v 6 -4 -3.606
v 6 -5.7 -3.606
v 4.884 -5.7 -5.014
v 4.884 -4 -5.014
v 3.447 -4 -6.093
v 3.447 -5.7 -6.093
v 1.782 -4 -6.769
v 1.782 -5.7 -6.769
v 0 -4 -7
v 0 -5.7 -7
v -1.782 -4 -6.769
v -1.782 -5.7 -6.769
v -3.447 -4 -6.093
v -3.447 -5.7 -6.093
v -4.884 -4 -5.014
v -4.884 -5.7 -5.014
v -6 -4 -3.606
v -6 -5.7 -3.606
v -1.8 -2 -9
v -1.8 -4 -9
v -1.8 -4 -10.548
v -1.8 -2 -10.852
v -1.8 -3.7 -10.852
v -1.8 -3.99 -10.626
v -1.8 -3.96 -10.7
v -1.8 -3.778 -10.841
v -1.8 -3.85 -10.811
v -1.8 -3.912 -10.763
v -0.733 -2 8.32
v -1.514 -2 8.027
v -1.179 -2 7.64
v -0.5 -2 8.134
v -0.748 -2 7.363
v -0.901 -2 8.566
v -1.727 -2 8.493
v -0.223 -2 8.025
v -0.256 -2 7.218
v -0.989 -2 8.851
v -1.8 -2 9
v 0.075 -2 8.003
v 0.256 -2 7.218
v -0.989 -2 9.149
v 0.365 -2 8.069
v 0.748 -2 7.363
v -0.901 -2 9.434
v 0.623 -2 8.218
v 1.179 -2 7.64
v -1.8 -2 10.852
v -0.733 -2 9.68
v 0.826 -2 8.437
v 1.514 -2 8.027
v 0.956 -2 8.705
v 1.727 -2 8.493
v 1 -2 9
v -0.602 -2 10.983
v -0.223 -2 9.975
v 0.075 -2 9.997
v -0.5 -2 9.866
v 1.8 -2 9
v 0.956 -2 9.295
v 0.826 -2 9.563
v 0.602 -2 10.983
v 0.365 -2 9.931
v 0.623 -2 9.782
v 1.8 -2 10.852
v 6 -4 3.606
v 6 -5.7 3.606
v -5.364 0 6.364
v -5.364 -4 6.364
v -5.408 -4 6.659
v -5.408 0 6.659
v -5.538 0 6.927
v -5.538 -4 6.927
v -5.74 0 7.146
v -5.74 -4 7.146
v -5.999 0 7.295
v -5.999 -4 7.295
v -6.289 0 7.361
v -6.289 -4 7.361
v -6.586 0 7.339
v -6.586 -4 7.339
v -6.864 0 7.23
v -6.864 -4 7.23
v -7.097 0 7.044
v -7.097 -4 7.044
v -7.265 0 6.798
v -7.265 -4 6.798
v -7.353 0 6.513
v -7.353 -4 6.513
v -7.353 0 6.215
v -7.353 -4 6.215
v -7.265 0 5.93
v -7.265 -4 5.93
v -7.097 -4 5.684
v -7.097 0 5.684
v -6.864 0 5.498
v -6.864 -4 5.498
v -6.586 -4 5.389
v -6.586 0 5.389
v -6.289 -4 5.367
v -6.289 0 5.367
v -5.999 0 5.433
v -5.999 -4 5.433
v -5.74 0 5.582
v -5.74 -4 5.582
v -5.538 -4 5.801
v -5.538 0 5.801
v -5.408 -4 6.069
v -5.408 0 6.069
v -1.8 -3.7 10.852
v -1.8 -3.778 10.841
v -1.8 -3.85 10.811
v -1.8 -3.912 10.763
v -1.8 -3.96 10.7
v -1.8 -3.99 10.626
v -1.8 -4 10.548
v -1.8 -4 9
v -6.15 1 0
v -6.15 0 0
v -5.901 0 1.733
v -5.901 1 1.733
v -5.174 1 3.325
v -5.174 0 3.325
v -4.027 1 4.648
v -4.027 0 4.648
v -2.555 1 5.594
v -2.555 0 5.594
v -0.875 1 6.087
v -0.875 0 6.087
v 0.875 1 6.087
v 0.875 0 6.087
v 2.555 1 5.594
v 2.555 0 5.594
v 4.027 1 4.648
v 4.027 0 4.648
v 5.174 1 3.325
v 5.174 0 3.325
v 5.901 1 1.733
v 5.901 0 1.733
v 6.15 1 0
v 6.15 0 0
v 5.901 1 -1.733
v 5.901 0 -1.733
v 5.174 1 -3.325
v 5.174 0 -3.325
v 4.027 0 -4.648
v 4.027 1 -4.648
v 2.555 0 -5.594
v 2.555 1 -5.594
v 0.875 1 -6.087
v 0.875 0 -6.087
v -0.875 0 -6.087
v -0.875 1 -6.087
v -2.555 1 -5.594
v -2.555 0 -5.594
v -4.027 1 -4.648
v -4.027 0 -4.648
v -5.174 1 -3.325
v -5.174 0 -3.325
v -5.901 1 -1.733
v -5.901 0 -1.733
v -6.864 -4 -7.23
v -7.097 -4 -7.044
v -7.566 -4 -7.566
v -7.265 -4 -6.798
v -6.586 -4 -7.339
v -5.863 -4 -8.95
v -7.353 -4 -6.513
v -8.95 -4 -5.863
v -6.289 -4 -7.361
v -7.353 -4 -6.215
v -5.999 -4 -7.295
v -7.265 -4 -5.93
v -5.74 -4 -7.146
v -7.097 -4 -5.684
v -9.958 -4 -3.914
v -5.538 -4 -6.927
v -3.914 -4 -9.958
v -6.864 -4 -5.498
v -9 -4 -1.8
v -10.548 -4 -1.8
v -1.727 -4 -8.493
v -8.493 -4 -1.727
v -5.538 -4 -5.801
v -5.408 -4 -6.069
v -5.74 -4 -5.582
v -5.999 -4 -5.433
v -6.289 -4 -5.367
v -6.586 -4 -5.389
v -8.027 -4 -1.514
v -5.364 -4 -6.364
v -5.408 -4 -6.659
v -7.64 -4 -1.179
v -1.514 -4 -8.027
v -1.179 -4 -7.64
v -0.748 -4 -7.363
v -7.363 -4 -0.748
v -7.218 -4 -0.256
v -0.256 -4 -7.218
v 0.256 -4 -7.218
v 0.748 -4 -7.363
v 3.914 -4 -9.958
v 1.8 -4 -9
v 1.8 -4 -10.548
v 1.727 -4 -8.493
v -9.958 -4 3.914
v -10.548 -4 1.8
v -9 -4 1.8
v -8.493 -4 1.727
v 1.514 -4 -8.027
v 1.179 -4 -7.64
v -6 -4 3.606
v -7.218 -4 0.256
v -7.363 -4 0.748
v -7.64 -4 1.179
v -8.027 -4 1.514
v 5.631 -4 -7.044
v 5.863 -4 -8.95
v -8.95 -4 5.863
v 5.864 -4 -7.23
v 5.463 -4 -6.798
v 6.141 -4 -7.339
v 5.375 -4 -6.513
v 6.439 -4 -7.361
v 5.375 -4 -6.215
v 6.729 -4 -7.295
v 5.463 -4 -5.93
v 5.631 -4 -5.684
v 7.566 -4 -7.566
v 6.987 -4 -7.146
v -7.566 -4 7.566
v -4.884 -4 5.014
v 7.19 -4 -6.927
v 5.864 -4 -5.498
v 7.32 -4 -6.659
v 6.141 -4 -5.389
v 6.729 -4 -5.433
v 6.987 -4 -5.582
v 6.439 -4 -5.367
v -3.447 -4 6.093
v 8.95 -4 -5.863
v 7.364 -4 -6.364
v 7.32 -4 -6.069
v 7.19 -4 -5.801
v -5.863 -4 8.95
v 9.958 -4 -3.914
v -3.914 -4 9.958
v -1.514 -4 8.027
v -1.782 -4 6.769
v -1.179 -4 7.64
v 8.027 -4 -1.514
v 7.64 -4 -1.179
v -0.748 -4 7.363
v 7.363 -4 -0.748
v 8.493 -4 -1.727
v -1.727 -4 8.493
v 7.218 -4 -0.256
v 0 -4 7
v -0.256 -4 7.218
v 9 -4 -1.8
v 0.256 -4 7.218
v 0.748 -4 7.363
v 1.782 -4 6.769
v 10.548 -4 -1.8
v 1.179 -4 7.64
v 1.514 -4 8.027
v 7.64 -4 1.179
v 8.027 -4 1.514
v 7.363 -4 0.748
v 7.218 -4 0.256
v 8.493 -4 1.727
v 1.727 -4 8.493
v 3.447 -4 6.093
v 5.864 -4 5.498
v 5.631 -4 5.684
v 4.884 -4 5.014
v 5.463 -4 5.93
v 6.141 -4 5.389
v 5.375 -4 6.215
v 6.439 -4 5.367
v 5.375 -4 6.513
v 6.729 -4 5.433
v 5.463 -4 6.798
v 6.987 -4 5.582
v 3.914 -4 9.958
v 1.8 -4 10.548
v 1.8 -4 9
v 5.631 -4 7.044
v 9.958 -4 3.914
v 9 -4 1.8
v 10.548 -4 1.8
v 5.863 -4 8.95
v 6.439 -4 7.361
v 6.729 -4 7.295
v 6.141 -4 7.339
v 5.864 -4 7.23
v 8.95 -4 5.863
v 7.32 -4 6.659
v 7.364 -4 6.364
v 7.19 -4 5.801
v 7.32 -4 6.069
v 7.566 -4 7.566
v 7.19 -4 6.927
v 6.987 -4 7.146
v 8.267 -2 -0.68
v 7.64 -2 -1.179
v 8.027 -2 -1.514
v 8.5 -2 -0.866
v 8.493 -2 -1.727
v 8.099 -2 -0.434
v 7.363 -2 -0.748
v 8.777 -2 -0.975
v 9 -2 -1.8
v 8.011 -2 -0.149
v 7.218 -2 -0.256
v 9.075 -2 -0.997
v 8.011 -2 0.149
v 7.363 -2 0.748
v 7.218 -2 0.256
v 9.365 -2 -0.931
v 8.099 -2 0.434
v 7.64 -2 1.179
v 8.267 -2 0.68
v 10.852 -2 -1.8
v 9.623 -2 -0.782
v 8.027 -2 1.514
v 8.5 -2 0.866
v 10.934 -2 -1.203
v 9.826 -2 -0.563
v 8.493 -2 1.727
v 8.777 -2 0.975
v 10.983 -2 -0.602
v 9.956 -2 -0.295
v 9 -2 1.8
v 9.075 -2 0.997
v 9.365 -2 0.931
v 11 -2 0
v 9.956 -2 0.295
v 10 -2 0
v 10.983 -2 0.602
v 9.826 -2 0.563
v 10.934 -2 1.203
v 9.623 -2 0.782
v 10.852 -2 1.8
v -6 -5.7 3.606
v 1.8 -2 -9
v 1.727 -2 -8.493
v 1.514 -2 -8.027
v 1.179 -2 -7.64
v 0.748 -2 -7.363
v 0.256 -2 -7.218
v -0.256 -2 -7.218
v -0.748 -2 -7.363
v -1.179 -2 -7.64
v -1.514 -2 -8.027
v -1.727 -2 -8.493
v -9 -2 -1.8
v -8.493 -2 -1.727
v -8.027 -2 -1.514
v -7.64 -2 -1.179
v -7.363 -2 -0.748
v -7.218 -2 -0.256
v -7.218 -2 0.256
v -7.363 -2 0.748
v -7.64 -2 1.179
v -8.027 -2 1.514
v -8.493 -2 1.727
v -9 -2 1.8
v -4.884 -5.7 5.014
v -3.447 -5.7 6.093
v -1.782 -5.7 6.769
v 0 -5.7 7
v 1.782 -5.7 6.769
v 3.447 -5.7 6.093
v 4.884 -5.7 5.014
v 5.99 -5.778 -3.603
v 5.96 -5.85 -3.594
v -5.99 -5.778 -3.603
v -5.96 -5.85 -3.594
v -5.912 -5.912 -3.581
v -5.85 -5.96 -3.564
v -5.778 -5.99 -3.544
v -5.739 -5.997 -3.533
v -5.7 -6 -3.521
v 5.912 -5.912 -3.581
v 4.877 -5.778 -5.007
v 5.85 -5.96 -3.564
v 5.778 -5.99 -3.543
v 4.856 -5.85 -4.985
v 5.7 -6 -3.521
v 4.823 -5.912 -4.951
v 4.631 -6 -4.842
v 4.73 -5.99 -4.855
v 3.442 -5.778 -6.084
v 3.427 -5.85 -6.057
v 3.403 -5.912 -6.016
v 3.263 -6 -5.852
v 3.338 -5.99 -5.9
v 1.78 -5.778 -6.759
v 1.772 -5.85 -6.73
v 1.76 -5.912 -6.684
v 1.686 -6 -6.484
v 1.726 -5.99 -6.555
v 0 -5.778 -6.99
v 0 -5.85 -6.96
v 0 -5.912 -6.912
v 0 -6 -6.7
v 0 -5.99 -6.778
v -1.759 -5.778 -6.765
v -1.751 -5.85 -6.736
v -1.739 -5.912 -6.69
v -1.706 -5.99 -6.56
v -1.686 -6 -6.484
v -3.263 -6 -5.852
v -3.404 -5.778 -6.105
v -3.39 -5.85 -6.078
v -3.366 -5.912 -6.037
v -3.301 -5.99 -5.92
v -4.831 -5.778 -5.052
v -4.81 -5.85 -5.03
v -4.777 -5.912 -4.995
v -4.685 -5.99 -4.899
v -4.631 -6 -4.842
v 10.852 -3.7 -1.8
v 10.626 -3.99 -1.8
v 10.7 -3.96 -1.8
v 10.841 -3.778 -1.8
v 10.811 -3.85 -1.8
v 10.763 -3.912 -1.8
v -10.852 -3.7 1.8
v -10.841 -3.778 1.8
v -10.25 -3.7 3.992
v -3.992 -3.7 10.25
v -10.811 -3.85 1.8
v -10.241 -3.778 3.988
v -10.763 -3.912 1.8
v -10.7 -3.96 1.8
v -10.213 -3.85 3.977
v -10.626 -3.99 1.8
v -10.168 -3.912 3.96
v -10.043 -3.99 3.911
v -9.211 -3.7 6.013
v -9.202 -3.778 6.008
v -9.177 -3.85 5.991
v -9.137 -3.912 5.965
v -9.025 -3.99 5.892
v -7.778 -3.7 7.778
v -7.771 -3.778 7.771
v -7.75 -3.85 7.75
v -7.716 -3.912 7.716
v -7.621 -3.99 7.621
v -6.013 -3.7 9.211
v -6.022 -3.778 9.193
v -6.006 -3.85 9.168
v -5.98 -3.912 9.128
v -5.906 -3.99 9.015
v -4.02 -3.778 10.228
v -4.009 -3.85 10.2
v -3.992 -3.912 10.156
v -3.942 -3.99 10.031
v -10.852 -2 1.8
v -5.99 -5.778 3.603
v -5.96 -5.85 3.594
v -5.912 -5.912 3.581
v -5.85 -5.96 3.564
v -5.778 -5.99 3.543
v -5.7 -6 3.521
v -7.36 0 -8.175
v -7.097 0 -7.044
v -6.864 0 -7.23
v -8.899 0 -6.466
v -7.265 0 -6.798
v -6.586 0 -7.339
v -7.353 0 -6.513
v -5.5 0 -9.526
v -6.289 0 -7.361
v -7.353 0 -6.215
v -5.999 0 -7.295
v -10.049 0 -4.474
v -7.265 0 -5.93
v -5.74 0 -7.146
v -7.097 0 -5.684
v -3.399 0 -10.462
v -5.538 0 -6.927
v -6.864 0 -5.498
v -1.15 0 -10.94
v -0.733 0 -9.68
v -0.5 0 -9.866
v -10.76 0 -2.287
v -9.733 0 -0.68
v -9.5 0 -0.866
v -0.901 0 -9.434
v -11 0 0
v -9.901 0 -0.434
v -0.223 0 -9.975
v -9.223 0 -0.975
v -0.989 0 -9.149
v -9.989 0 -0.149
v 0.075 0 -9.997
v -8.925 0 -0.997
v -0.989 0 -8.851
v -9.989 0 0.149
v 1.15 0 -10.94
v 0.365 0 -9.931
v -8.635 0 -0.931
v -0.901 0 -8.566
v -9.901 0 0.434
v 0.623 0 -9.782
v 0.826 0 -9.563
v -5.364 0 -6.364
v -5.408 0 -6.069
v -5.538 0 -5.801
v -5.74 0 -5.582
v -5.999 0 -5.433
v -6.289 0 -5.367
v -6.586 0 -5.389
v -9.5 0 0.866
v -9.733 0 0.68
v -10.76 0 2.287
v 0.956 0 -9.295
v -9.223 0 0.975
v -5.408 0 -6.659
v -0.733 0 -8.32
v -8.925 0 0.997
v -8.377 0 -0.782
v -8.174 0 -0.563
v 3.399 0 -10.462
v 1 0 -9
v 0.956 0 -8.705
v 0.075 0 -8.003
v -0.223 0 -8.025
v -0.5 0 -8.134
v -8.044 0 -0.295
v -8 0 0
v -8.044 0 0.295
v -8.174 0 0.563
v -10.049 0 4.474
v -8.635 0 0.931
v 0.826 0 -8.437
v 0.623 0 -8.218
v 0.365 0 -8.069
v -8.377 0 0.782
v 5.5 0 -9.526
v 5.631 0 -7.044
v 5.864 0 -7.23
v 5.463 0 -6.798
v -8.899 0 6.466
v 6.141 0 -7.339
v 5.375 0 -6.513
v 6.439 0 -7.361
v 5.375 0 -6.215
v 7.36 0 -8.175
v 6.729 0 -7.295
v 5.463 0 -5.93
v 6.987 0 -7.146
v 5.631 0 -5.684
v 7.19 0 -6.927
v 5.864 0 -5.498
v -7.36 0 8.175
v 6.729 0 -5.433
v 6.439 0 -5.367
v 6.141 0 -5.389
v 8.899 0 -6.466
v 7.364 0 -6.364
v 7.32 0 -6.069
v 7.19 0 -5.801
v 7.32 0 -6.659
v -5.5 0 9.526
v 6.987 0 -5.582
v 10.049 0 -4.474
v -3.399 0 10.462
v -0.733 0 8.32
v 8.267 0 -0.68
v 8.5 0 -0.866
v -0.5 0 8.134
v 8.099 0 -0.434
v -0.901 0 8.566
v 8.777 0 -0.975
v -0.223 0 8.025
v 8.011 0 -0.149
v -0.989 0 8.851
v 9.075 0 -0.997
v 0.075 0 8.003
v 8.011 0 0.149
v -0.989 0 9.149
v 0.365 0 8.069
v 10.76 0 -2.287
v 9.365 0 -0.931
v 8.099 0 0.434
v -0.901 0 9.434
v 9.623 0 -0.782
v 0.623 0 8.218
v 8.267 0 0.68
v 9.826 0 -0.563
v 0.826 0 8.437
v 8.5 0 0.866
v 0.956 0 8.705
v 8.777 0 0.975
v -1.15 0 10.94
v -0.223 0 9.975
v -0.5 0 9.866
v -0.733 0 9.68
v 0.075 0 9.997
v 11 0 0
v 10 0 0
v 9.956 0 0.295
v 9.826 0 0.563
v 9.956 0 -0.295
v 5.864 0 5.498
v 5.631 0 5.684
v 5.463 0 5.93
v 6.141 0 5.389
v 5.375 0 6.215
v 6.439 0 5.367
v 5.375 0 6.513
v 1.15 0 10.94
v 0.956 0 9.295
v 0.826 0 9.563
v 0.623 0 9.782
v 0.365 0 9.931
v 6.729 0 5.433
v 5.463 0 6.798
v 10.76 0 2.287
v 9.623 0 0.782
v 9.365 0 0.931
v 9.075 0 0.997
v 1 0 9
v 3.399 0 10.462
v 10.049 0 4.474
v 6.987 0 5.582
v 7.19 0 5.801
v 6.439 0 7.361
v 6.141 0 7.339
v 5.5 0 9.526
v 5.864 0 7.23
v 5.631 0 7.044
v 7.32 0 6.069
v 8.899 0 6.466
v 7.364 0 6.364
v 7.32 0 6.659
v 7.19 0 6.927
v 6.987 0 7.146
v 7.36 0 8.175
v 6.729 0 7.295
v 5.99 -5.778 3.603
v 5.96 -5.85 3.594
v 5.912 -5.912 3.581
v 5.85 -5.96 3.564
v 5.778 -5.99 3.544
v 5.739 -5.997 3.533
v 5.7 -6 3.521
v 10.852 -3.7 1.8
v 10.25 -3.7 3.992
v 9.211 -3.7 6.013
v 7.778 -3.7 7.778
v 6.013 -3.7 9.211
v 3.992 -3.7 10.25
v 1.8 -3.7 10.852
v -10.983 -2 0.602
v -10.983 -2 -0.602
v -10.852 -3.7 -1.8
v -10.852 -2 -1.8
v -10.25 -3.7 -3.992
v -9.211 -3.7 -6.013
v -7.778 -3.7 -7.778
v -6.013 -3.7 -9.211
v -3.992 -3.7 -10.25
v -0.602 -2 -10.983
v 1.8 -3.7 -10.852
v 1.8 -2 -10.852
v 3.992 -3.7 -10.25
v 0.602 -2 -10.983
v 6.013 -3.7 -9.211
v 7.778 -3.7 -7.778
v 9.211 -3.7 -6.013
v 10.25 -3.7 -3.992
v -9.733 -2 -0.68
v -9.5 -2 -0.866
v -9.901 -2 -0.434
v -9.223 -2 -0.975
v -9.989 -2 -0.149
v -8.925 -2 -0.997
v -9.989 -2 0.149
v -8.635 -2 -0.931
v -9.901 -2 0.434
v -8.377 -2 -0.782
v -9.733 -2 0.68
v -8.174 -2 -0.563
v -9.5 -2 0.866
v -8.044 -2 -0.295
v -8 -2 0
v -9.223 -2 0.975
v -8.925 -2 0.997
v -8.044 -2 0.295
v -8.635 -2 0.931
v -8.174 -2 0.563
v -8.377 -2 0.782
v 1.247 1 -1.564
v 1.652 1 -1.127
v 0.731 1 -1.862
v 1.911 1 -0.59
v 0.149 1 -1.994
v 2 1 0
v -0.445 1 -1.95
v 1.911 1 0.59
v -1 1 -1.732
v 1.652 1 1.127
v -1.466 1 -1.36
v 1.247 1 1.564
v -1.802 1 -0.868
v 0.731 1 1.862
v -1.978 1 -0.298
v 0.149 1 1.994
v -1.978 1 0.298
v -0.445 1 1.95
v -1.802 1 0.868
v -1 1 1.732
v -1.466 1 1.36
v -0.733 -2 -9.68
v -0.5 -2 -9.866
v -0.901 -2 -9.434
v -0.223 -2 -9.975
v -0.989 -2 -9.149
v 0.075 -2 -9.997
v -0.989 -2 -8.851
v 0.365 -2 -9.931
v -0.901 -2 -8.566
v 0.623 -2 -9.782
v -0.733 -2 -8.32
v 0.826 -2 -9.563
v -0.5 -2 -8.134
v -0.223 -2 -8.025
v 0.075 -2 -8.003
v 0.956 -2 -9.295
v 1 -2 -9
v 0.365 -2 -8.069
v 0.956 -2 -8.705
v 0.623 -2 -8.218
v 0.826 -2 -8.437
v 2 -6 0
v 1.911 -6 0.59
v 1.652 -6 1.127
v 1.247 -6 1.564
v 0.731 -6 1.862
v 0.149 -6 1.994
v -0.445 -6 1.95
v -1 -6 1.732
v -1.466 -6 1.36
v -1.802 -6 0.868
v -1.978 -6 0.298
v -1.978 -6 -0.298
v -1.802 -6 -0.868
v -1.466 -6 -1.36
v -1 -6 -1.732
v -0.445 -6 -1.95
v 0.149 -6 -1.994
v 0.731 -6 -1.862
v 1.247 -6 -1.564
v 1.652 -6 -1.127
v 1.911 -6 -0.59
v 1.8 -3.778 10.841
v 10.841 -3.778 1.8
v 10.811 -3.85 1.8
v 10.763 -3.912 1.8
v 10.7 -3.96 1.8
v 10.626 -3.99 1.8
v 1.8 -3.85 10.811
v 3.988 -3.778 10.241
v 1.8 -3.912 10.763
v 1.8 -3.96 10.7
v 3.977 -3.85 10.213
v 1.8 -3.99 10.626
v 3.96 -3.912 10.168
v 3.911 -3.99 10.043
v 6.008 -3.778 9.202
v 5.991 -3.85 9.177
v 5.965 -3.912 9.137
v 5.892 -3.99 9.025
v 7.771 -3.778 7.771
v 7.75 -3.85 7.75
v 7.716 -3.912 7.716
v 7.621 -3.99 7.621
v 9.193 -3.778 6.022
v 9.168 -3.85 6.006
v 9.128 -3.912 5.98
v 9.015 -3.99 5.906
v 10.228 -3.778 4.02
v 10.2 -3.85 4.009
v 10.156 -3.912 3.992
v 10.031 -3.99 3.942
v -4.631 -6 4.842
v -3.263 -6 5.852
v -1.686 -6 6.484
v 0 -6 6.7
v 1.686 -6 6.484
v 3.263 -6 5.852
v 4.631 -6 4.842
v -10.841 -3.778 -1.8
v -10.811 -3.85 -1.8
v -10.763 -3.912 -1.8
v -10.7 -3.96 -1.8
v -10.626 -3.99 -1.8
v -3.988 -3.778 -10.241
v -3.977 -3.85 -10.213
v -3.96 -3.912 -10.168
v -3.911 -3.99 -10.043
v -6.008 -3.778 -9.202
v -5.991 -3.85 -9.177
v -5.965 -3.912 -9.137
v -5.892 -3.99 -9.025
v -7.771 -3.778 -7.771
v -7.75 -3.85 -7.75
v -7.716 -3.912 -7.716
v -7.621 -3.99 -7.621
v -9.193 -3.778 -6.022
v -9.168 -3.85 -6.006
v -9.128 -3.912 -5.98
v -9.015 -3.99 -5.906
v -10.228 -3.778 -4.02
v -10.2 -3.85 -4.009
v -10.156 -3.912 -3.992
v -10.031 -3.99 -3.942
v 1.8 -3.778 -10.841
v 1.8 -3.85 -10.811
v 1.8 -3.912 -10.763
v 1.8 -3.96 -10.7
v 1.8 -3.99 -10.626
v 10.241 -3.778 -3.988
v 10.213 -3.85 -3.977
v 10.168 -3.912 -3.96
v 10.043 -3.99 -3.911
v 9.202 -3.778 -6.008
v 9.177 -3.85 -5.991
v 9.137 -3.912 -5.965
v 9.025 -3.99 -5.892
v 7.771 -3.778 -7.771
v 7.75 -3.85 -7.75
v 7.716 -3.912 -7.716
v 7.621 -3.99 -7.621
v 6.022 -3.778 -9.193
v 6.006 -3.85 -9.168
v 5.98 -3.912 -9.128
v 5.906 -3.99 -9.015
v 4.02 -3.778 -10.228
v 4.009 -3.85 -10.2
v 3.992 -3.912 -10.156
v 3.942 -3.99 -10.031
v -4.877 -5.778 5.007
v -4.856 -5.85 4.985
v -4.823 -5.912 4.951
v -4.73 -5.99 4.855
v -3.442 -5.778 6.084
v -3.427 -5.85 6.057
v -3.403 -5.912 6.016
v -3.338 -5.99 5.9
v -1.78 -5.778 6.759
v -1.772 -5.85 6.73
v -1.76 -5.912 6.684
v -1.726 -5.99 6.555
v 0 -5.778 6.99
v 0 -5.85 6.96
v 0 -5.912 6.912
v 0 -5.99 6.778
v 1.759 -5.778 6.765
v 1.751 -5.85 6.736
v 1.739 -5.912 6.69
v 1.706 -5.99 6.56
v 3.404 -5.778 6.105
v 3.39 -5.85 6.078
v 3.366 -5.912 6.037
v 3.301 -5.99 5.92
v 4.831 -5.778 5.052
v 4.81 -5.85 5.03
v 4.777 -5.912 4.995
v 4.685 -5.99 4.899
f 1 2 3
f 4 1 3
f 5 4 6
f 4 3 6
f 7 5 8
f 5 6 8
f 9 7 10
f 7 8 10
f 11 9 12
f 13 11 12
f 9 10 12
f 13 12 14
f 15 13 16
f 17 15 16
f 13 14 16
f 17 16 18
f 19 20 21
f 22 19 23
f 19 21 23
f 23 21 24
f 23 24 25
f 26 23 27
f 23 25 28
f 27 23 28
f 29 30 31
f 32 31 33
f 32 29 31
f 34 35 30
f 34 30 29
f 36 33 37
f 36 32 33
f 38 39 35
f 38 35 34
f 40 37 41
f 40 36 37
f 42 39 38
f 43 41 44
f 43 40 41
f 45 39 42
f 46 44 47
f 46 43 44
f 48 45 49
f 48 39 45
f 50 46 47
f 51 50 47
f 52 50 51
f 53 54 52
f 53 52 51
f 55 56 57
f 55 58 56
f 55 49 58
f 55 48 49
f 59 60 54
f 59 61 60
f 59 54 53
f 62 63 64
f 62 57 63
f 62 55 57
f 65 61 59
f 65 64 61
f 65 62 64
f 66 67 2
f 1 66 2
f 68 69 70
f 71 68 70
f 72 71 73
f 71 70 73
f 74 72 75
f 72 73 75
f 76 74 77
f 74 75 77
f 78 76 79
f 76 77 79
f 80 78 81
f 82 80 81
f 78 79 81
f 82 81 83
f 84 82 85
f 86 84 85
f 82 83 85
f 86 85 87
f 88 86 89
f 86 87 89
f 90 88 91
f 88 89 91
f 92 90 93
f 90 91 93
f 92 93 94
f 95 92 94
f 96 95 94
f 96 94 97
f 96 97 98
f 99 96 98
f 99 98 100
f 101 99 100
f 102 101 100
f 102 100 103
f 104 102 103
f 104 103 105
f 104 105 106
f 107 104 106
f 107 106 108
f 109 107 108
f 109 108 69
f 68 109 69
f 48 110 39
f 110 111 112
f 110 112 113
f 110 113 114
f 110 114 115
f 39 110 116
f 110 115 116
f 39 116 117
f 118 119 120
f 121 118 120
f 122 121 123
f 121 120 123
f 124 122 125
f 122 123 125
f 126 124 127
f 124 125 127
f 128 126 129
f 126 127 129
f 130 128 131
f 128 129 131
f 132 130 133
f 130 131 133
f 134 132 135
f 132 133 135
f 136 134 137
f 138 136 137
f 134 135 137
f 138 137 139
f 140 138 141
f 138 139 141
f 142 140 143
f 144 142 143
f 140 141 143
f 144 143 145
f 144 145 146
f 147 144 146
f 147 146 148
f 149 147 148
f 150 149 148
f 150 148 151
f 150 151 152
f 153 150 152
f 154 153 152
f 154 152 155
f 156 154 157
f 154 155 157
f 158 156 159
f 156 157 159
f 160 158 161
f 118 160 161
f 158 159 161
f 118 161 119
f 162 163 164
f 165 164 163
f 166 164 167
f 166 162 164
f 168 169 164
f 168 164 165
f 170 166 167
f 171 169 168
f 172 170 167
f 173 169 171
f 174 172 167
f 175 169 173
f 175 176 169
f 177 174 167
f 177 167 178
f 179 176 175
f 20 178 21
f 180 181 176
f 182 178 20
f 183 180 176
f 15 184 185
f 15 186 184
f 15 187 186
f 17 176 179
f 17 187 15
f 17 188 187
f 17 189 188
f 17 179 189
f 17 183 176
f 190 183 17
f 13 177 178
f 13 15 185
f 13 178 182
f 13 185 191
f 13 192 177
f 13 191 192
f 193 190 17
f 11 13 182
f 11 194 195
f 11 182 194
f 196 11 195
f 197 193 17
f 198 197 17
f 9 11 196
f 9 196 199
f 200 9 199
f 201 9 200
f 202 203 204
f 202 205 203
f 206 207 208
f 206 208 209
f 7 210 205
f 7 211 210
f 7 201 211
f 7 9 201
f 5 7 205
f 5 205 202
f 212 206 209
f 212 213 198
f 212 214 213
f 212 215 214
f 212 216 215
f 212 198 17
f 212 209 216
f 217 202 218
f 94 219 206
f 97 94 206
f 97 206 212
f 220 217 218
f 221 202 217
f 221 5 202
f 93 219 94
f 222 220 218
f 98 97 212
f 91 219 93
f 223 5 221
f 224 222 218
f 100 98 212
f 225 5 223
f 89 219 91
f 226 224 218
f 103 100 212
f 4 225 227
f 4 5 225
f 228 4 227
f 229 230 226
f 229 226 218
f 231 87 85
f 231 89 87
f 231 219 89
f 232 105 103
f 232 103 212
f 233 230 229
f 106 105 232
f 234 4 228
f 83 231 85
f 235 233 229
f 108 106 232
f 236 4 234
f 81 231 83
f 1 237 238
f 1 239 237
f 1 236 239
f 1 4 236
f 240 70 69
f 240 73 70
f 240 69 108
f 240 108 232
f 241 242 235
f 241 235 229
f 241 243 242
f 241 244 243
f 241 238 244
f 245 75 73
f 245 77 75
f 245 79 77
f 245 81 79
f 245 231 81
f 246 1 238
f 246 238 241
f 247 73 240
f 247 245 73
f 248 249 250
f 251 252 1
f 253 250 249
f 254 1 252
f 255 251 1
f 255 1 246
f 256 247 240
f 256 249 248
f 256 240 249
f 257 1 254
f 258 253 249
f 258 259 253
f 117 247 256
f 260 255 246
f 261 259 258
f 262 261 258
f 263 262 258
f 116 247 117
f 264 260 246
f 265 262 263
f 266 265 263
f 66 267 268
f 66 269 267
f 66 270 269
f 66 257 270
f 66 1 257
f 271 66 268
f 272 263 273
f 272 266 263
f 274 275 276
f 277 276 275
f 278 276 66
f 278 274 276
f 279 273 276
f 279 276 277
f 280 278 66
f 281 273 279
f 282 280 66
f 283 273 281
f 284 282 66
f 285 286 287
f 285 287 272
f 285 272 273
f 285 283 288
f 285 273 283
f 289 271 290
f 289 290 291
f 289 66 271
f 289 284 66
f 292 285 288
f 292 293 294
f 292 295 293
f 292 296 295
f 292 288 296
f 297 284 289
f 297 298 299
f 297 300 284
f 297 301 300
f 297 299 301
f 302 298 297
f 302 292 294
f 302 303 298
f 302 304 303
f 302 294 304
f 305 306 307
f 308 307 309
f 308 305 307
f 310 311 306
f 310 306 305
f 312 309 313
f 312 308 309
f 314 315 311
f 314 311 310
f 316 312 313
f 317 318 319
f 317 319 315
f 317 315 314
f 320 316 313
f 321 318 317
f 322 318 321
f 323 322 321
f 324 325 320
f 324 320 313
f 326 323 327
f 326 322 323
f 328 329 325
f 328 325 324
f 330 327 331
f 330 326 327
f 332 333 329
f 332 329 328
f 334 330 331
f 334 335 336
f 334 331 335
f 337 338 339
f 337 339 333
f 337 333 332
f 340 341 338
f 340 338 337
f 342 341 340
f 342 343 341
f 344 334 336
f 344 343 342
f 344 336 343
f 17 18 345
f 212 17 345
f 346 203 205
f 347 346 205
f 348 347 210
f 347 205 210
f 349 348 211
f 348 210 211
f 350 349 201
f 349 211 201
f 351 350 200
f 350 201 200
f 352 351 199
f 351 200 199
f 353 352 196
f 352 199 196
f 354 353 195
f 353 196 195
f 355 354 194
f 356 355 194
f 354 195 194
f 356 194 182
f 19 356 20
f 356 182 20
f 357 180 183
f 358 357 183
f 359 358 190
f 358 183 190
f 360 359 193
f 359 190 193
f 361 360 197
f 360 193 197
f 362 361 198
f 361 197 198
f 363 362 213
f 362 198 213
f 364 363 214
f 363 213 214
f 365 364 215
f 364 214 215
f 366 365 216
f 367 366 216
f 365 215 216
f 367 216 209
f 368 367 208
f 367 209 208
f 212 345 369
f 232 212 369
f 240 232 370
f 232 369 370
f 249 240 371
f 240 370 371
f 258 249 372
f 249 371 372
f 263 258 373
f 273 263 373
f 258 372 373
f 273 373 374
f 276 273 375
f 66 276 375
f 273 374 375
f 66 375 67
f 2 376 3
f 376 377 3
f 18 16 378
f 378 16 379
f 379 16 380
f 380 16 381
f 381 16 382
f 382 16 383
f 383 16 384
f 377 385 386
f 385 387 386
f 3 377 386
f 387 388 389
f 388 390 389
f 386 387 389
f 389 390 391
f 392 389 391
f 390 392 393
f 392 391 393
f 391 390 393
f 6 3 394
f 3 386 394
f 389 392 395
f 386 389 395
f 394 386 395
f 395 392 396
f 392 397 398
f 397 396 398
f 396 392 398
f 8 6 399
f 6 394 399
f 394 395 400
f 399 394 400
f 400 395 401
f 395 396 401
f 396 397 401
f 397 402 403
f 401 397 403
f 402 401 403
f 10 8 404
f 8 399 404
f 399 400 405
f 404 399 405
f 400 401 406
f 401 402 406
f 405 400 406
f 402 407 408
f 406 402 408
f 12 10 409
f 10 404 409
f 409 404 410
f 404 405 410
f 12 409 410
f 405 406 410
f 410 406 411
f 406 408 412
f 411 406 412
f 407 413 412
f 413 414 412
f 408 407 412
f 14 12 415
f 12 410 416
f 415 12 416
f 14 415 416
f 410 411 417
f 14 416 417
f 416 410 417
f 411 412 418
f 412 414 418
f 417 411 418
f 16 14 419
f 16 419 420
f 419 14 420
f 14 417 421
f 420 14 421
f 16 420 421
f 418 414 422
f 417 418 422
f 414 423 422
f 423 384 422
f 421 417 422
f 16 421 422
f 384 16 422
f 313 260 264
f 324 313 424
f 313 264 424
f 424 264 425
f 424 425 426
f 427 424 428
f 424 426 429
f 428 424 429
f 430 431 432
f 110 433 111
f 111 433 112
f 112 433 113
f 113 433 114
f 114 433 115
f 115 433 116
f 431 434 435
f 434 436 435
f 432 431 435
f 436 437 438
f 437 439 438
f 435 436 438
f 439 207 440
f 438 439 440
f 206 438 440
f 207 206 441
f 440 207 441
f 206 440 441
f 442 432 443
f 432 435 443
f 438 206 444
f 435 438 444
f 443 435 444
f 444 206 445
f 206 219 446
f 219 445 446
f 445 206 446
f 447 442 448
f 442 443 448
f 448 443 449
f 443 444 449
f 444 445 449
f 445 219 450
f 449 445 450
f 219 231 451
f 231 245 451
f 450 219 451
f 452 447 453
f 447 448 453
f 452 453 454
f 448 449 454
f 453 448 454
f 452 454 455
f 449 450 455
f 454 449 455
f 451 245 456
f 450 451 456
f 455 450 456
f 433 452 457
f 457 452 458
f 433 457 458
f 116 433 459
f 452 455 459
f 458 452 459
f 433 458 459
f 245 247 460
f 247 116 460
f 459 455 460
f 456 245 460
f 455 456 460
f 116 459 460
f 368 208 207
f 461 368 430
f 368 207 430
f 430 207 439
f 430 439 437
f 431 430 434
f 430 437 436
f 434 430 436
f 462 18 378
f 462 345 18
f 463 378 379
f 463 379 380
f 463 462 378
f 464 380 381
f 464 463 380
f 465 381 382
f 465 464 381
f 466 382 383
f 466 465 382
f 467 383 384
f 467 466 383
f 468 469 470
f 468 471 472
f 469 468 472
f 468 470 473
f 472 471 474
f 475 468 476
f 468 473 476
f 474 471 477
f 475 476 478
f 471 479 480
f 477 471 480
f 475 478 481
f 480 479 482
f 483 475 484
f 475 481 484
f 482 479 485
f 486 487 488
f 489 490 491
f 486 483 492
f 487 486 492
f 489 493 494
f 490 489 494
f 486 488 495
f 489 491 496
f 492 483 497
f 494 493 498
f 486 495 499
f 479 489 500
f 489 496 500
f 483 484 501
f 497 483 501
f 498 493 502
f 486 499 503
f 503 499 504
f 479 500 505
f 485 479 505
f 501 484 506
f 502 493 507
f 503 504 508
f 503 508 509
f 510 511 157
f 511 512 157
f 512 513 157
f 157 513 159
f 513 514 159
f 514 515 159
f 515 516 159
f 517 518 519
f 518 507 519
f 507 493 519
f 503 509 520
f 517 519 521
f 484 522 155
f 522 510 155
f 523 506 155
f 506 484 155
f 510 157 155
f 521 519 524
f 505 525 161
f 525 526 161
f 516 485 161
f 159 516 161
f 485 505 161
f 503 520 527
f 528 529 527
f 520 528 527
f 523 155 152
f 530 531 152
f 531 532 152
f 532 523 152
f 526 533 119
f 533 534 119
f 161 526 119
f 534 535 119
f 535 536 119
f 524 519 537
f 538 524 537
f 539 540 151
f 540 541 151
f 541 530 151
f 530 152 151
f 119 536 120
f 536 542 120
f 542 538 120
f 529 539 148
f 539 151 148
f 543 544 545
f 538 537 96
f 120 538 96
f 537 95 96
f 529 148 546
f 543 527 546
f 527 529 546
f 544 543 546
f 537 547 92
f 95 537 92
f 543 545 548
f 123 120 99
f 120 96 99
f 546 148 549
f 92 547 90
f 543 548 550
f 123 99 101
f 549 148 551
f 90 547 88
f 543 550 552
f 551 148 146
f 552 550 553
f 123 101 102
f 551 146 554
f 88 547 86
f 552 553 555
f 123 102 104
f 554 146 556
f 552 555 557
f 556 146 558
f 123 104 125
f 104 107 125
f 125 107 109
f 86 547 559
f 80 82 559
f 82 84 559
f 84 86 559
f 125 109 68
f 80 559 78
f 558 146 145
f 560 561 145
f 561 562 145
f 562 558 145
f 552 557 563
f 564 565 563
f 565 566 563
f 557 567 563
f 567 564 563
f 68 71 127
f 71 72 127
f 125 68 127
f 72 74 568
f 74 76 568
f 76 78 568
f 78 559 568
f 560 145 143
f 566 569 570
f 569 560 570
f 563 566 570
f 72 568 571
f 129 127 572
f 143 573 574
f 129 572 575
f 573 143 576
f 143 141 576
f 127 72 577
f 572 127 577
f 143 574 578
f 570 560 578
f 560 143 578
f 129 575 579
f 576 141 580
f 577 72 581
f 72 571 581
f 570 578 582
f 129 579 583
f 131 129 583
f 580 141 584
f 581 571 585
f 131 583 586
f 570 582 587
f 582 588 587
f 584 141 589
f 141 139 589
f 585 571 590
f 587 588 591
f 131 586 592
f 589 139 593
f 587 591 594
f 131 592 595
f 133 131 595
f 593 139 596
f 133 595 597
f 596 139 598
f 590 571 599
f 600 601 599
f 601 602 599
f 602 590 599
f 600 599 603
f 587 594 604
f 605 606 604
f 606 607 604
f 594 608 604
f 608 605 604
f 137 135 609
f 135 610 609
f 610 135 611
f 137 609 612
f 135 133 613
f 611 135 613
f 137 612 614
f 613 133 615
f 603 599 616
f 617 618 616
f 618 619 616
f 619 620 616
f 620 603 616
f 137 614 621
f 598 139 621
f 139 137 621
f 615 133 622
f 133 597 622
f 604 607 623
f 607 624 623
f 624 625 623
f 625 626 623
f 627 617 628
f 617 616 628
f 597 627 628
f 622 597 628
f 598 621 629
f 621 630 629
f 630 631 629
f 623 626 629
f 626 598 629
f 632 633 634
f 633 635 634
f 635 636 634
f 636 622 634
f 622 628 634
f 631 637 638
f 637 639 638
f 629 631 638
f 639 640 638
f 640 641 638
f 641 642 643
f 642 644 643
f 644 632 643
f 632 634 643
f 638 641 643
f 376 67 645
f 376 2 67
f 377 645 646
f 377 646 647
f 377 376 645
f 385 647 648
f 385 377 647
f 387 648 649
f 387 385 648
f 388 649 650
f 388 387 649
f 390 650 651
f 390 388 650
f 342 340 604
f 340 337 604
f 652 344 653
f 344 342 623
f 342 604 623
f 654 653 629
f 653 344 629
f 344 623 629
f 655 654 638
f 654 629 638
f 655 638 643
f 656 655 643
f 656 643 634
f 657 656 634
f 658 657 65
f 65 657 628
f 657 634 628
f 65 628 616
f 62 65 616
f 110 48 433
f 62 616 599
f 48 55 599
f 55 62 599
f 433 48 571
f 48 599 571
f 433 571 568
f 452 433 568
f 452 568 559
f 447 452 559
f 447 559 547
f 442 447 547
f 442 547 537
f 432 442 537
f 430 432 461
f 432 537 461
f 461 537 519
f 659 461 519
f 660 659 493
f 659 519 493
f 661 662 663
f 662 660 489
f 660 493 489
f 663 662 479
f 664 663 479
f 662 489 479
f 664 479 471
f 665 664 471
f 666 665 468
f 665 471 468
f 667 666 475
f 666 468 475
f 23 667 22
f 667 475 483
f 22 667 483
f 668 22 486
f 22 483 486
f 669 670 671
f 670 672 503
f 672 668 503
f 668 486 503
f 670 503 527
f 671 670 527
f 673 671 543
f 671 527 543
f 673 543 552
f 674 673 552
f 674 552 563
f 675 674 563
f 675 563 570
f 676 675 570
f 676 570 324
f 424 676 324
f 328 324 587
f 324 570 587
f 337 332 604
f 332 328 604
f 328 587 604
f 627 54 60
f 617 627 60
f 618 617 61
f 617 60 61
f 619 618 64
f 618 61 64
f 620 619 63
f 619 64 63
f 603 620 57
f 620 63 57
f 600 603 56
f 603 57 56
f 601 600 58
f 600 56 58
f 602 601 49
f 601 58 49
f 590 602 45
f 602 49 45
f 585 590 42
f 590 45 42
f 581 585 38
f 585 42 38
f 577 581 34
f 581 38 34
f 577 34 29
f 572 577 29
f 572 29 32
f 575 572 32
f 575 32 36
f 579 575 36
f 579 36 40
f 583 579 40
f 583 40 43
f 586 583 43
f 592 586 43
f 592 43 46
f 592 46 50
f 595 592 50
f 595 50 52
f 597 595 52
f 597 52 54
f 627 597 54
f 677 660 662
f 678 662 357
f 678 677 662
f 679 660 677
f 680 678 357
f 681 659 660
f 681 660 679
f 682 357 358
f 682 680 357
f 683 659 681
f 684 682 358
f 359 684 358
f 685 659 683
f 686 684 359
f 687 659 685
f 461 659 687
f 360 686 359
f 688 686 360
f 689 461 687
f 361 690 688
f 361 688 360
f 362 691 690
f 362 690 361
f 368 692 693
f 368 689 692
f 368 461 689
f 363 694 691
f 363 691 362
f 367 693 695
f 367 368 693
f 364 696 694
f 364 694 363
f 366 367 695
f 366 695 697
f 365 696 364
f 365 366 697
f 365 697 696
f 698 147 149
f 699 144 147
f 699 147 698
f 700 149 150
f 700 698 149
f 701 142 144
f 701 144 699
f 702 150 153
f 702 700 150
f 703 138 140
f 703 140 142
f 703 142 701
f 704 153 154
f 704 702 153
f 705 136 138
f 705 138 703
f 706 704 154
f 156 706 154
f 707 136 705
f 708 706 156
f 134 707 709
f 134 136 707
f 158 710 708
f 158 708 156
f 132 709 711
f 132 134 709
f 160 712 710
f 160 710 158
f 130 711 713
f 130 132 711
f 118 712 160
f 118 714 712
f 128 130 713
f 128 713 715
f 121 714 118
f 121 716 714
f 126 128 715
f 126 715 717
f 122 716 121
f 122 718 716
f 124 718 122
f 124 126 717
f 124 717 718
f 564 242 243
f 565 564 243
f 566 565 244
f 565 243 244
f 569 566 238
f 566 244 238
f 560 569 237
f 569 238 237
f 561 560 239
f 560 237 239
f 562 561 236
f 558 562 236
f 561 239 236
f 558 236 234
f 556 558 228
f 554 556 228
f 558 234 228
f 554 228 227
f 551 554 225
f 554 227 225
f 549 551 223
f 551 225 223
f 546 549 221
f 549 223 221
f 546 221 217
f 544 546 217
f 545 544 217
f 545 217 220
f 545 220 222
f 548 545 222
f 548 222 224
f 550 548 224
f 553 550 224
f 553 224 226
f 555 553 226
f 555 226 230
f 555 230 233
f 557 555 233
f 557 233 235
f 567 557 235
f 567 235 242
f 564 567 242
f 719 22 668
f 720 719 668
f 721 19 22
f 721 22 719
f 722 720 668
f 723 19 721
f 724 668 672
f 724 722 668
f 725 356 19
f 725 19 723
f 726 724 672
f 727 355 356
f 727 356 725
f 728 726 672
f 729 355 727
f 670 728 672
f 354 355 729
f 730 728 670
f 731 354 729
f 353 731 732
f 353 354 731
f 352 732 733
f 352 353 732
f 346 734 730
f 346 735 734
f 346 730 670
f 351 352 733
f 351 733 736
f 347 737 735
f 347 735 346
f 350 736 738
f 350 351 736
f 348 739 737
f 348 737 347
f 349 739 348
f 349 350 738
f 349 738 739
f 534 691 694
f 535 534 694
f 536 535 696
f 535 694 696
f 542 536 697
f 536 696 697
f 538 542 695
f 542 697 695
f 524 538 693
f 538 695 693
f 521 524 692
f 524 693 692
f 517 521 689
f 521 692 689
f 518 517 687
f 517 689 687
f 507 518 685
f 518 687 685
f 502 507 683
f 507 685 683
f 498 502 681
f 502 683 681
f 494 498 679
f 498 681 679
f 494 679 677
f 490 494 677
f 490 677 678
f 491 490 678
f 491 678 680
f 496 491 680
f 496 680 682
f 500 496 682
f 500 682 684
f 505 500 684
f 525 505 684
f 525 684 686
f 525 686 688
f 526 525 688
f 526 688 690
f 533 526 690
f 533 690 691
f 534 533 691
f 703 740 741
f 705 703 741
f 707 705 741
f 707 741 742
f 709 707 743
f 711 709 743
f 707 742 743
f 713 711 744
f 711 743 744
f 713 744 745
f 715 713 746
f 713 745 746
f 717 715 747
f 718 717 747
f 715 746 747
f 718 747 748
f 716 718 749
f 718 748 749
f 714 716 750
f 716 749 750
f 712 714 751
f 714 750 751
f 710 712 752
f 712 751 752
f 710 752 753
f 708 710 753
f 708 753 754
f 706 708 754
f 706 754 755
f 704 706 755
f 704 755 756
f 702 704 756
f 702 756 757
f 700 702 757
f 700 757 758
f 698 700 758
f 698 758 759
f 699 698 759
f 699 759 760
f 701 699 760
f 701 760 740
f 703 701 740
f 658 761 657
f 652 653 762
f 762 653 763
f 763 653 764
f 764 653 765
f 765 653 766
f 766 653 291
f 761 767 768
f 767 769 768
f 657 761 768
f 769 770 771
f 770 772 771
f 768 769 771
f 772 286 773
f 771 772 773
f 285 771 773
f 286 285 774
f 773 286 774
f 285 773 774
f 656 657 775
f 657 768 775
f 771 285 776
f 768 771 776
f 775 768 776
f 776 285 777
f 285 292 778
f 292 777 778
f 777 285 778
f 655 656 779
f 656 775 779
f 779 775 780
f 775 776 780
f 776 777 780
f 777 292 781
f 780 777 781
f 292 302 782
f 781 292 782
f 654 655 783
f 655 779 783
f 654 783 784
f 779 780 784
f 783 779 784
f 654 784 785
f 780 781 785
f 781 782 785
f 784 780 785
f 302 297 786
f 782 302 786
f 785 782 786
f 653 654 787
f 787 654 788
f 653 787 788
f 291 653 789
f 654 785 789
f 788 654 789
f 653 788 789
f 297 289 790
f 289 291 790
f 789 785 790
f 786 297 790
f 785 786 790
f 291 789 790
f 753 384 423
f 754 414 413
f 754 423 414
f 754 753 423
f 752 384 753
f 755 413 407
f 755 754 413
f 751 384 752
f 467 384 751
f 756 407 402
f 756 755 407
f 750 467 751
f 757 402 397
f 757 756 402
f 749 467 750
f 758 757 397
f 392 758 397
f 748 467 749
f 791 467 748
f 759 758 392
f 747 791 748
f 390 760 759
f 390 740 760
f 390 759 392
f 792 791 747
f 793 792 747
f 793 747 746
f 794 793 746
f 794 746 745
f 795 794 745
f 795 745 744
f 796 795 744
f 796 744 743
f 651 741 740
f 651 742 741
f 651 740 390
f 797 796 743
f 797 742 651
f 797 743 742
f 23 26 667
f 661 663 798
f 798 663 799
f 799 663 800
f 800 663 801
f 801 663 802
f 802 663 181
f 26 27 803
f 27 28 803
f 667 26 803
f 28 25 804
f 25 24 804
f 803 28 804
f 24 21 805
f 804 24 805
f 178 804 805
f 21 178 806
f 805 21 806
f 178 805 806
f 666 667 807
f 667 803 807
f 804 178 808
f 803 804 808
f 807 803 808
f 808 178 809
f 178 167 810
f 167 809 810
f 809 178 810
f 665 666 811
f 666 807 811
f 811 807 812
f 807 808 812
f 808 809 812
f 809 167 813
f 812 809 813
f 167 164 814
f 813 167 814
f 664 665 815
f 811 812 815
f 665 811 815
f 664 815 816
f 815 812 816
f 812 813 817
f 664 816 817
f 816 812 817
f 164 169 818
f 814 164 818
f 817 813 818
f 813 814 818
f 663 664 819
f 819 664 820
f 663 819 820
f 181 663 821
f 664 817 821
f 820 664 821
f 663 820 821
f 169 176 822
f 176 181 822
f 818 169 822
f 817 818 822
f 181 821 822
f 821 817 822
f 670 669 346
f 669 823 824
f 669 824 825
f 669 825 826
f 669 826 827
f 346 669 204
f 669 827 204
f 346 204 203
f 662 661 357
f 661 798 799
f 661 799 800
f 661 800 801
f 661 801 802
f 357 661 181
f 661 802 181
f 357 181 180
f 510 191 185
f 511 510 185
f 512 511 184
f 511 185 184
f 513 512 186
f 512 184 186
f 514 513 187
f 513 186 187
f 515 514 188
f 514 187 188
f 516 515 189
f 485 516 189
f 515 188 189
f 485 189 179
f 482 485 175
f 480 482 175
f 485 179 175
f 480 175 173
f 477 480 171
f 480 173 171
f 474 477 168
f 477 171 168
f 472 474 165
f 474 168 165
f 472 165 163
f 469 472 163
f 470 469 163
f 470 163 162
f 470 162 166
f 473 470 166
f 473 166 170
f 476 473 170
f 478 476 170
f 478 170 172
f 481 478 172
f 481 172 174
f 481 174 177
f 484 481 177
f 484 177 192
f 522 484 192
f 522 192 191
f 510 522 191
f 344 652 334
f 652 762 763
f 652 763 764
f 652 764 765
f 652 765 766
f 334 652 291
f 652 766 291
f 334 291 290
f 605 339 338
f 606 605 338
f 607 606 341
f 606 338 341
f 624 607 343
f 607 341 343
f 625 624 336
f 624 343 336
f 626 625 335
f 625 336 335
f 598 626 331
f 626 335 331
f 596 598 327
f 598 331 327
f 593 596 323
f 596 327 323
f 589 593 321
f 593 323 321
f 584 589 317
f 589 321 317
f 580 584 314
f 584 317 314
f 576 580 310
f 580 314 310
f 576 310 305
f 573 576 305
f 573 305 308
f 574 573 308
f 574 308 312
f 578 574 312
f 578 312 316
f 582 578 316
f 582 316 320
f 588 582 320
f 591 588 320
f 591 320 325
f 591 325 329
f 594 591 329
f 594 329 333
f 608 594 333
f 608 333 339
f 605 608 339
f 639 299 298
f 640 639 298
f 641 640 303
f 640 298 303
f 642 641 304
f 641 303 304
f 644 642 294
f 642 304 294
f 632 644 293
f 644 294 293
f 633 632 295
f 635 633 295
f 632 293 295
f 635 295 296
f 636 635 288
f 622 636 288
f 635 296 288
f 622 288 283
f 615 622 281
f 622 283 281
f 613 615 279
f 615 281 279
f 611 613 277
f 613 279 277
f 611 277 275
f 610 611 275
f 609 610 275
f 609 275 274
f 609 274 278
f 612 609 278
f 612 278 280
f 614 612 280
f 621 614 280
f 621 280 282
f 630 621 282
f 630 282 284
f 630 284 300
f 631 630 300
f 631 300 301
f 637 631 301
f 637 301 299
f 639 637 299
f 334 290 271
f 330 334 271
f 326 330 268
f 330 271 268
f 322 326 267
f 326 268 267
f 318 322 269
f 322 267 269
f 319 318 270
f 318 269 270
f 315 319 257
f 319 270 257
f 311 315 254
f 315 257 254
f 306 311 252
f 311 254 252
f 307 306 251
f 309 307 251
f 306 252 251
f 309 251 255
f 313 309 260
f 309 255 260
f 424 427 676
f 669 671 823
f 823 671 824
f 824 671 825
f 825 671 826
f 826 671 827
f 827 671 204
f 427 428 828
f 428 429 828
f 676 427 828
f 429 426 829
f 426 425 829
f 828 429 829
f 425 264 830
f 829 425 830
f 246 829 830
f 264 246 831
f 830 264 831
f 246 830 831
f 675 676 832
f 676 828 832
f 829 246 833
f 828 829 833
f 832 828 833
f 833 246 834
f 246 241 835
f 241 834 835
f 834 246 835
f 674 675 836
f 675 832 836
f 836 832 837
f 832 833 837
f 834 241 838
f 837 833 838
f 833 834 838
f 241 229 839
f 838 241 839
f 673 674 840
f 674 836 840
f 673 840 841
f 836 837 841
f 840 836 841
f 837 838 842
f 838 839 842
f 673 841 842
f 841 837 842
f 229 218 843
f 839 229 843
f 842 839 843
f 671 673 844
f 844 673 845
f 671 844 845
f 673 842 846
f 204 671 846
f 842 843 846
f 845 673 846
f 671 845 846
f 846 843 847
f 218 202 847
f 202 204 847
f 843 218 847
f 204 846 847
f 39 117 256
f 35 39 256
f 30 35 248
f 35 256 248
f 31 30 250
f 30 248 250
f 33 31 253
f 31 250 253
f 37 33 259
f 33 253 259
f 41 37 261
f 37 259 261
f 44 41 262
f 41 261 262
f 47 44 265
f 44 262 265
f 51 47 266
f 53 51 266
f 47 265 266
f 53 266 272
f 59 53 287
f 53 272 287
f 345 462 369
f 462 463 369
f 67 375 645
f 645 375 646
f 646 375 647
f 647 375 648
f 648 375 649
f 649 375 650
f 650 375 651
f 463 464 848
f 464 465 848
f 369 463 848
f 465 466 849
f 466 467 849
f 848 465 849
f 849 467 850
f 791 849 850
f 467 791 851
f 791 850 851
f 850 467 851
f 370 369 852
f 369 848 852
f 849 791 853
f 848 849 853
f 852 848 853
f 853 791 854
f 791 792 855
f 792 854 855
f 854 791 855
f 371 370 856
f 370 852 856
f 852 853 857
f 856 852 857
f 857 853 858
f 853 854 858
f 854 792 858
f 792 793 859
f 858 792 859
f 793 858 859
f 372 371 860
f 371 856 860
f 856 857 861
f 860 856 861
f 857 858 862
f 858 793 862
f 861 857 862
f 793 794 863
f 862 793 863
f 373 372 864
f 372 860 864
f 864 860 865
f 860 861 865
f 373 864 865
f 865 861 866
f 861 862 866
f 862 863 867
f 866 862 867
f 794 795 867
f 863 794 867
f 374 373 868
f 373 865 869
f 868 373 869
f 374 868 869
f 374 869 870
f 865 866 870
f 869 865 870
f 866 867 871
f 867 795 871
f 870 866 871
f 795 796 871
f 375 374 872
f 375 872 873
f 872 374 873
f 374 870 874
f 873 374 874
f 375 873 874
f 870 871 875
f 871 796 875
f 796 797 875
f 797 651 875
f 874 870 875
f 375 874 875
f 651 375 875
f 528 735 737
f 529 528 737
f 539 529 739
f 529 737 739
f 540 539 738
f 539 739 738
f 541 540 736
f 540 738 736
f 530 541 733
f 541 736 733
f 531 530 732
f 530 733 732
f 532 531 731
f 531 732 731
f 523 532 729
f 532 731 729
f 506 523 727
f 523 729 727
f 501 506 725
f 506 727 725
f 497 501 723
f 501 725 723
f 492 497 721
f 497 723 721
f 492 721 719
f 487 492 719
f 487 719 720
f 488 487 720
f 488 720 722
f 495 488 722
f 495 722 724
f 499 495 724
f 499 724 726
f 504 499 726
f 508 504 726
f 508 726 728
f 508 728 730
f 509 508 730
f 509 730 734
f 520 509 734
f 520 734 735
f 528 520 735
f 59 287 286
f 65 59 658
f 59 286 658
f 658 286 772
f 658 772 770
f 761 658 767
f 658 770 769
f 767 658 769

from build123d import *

# Parameters (mm, degrees)
F0_R      = 11
F1_DEPTH  = 6
F2_R      = 16
F3_DEPTH  = 2
F5_R      = 1
F6_DEPTH  = 4.001
F9_DEPTH  = 2
F10_R     = 0.3
F11_R     = 6.15
F12_DEPTH = 1
F4_R      = 2
F13_DEPTH = 7.001


with BuildPart() as f1:
    # F0 (on Front) → F1 (new body)
    with BuildSketch(Plane.XZ):
        Circle(F0_R)
    extrude(amount=F1_DEPTH)

    # F2 (on face) → F3 (cut)
    with BuildSketch(Plane.XZ.offset(6)):
        Circle(F2_R)
        with BuildLine():
            ThreePointArc((6, -3.6055512755), (0, -7), (-6, -3.6055512755))
            Line((-6, -3.6055512755), (-6, 3.6055512755))
            ThreePointArc((-6, 3.6055512755), (0, 7), (6, 3.6055512755))
            Line((6, 3.6055512755), (6, -3.6055512755))
        make_face(mode=Mode.SUBTRACT)
    extrude(amount=-F3_DEPTH, mode=Mode.SUBTRACT)

    # F5 (on face) → F6 (cut, through all)
    with BuildSketch(Plane.XZ.offset(4)):
        with Locations((0, 9)):
            Circle(F5_R)
        with Locations((-6.3639610307, 6.3639610307)):
            Circle(F5_R)
        with Locations((-9, 0)):
            Circle(F5_R)
        with Locations((-6.3639610307, -6.3639610307)):
            Circle(F5_R)
        with Locations((0, -9)):
            Circle(F5_R)
        with Locations((6.3639610307, -6.3639610307)):
            Circle(F5_R)
        with Locations((9, 0)):
            Circle(F5_R)
        with Locations((6.3639610307, 6.3639610307)):
            Circle(F5_R)
    extrude(amount=-F6_DEPTH, mode=Mode.SUBTRACT)

    # F8 (on face) → F9 (cut)
    with BuildSketch(Plane.XZ.offset(4)):
        with BuildLine():
            Line((-1.8, 11.6544359102), (-1.8, 9))
            ThreePointArc((-1.8, 9), (0, 7.2), (1.8, 9))
            Line((1.8, 9), (1.8, 11.6544359102))
            Line((1.8, 11.6544359102), (-1.8, 11.6544359102))
        make_face()
        with BuildLine():
            Line((-11.6544359102, -1.8), (-9, -1.8))
            ThreePointArc((-9, -1.8), (-7.2, 0), (-9, 1.8))
            Line((-9, 1.8), (-11.6544359102, 1.8))
            Line((-11.6544359102, 1.8), (-11.6544359102, -1.8))
        make_face()
        with BuildLine():
            Line((1.8, -11.6544359102), (1.8, -9))
            ThreePointArc((1.8, -9), (0, -7.2), (-1.8, -9))
            Line((-1.8, -9), (-1.8, -11.6544359102))
            Line((-1.8, -11.6544359102), (1.8, -11.6544359102))
        make_face()
        with BuildLine():
            Line((11.6544359102, 1.8), (9, 1.8))
            ThreePointArc((9, 1.8), (7.2, 0), (9, -1.8))
            Line((9, -1.8), (11.6544359102, -1.8))
            Line((11.6544359102, -1.8), (11.6544359102, 1.8))
        make_face()
    extrude(amount=-F9_DEPTH, mode=Mode.SUBTRACT)

    # F10
    f10_edges = [f1.edges().sort_by_distance(p)[0] for p in [
        (0, -6, -7),
        (-6, -6, 0),
        (6, -6, 0),
        (0, -6, 7),
        (7.778175, -4, -7.778175),
        (-7.778175, -4, -7.778175),
        (-7.778175, -4, 7.778175),
        (7.778175, -4, 7.778175),
    ]]
    fillet(f10_edges, radius=F10_R)

    # F11 (on face) → F12 (join)
    with BuildSketch(Plane(origin=(0, 0, 0), x_dir=(-1, 0, 0), z_dir=(0, 1, 0))):
        Circle(F11_R)
    extrude(amount=F12_DEPTH)

    # F4 (on face) → F13 (cut, through all)
    with BuildSketch(Plane.XZ.offset(6)):
        Circle(F4_R)
    extrude(amount=-F13_DEPTH, mode=Mode.SUBTRACT)


solid = f1.part
